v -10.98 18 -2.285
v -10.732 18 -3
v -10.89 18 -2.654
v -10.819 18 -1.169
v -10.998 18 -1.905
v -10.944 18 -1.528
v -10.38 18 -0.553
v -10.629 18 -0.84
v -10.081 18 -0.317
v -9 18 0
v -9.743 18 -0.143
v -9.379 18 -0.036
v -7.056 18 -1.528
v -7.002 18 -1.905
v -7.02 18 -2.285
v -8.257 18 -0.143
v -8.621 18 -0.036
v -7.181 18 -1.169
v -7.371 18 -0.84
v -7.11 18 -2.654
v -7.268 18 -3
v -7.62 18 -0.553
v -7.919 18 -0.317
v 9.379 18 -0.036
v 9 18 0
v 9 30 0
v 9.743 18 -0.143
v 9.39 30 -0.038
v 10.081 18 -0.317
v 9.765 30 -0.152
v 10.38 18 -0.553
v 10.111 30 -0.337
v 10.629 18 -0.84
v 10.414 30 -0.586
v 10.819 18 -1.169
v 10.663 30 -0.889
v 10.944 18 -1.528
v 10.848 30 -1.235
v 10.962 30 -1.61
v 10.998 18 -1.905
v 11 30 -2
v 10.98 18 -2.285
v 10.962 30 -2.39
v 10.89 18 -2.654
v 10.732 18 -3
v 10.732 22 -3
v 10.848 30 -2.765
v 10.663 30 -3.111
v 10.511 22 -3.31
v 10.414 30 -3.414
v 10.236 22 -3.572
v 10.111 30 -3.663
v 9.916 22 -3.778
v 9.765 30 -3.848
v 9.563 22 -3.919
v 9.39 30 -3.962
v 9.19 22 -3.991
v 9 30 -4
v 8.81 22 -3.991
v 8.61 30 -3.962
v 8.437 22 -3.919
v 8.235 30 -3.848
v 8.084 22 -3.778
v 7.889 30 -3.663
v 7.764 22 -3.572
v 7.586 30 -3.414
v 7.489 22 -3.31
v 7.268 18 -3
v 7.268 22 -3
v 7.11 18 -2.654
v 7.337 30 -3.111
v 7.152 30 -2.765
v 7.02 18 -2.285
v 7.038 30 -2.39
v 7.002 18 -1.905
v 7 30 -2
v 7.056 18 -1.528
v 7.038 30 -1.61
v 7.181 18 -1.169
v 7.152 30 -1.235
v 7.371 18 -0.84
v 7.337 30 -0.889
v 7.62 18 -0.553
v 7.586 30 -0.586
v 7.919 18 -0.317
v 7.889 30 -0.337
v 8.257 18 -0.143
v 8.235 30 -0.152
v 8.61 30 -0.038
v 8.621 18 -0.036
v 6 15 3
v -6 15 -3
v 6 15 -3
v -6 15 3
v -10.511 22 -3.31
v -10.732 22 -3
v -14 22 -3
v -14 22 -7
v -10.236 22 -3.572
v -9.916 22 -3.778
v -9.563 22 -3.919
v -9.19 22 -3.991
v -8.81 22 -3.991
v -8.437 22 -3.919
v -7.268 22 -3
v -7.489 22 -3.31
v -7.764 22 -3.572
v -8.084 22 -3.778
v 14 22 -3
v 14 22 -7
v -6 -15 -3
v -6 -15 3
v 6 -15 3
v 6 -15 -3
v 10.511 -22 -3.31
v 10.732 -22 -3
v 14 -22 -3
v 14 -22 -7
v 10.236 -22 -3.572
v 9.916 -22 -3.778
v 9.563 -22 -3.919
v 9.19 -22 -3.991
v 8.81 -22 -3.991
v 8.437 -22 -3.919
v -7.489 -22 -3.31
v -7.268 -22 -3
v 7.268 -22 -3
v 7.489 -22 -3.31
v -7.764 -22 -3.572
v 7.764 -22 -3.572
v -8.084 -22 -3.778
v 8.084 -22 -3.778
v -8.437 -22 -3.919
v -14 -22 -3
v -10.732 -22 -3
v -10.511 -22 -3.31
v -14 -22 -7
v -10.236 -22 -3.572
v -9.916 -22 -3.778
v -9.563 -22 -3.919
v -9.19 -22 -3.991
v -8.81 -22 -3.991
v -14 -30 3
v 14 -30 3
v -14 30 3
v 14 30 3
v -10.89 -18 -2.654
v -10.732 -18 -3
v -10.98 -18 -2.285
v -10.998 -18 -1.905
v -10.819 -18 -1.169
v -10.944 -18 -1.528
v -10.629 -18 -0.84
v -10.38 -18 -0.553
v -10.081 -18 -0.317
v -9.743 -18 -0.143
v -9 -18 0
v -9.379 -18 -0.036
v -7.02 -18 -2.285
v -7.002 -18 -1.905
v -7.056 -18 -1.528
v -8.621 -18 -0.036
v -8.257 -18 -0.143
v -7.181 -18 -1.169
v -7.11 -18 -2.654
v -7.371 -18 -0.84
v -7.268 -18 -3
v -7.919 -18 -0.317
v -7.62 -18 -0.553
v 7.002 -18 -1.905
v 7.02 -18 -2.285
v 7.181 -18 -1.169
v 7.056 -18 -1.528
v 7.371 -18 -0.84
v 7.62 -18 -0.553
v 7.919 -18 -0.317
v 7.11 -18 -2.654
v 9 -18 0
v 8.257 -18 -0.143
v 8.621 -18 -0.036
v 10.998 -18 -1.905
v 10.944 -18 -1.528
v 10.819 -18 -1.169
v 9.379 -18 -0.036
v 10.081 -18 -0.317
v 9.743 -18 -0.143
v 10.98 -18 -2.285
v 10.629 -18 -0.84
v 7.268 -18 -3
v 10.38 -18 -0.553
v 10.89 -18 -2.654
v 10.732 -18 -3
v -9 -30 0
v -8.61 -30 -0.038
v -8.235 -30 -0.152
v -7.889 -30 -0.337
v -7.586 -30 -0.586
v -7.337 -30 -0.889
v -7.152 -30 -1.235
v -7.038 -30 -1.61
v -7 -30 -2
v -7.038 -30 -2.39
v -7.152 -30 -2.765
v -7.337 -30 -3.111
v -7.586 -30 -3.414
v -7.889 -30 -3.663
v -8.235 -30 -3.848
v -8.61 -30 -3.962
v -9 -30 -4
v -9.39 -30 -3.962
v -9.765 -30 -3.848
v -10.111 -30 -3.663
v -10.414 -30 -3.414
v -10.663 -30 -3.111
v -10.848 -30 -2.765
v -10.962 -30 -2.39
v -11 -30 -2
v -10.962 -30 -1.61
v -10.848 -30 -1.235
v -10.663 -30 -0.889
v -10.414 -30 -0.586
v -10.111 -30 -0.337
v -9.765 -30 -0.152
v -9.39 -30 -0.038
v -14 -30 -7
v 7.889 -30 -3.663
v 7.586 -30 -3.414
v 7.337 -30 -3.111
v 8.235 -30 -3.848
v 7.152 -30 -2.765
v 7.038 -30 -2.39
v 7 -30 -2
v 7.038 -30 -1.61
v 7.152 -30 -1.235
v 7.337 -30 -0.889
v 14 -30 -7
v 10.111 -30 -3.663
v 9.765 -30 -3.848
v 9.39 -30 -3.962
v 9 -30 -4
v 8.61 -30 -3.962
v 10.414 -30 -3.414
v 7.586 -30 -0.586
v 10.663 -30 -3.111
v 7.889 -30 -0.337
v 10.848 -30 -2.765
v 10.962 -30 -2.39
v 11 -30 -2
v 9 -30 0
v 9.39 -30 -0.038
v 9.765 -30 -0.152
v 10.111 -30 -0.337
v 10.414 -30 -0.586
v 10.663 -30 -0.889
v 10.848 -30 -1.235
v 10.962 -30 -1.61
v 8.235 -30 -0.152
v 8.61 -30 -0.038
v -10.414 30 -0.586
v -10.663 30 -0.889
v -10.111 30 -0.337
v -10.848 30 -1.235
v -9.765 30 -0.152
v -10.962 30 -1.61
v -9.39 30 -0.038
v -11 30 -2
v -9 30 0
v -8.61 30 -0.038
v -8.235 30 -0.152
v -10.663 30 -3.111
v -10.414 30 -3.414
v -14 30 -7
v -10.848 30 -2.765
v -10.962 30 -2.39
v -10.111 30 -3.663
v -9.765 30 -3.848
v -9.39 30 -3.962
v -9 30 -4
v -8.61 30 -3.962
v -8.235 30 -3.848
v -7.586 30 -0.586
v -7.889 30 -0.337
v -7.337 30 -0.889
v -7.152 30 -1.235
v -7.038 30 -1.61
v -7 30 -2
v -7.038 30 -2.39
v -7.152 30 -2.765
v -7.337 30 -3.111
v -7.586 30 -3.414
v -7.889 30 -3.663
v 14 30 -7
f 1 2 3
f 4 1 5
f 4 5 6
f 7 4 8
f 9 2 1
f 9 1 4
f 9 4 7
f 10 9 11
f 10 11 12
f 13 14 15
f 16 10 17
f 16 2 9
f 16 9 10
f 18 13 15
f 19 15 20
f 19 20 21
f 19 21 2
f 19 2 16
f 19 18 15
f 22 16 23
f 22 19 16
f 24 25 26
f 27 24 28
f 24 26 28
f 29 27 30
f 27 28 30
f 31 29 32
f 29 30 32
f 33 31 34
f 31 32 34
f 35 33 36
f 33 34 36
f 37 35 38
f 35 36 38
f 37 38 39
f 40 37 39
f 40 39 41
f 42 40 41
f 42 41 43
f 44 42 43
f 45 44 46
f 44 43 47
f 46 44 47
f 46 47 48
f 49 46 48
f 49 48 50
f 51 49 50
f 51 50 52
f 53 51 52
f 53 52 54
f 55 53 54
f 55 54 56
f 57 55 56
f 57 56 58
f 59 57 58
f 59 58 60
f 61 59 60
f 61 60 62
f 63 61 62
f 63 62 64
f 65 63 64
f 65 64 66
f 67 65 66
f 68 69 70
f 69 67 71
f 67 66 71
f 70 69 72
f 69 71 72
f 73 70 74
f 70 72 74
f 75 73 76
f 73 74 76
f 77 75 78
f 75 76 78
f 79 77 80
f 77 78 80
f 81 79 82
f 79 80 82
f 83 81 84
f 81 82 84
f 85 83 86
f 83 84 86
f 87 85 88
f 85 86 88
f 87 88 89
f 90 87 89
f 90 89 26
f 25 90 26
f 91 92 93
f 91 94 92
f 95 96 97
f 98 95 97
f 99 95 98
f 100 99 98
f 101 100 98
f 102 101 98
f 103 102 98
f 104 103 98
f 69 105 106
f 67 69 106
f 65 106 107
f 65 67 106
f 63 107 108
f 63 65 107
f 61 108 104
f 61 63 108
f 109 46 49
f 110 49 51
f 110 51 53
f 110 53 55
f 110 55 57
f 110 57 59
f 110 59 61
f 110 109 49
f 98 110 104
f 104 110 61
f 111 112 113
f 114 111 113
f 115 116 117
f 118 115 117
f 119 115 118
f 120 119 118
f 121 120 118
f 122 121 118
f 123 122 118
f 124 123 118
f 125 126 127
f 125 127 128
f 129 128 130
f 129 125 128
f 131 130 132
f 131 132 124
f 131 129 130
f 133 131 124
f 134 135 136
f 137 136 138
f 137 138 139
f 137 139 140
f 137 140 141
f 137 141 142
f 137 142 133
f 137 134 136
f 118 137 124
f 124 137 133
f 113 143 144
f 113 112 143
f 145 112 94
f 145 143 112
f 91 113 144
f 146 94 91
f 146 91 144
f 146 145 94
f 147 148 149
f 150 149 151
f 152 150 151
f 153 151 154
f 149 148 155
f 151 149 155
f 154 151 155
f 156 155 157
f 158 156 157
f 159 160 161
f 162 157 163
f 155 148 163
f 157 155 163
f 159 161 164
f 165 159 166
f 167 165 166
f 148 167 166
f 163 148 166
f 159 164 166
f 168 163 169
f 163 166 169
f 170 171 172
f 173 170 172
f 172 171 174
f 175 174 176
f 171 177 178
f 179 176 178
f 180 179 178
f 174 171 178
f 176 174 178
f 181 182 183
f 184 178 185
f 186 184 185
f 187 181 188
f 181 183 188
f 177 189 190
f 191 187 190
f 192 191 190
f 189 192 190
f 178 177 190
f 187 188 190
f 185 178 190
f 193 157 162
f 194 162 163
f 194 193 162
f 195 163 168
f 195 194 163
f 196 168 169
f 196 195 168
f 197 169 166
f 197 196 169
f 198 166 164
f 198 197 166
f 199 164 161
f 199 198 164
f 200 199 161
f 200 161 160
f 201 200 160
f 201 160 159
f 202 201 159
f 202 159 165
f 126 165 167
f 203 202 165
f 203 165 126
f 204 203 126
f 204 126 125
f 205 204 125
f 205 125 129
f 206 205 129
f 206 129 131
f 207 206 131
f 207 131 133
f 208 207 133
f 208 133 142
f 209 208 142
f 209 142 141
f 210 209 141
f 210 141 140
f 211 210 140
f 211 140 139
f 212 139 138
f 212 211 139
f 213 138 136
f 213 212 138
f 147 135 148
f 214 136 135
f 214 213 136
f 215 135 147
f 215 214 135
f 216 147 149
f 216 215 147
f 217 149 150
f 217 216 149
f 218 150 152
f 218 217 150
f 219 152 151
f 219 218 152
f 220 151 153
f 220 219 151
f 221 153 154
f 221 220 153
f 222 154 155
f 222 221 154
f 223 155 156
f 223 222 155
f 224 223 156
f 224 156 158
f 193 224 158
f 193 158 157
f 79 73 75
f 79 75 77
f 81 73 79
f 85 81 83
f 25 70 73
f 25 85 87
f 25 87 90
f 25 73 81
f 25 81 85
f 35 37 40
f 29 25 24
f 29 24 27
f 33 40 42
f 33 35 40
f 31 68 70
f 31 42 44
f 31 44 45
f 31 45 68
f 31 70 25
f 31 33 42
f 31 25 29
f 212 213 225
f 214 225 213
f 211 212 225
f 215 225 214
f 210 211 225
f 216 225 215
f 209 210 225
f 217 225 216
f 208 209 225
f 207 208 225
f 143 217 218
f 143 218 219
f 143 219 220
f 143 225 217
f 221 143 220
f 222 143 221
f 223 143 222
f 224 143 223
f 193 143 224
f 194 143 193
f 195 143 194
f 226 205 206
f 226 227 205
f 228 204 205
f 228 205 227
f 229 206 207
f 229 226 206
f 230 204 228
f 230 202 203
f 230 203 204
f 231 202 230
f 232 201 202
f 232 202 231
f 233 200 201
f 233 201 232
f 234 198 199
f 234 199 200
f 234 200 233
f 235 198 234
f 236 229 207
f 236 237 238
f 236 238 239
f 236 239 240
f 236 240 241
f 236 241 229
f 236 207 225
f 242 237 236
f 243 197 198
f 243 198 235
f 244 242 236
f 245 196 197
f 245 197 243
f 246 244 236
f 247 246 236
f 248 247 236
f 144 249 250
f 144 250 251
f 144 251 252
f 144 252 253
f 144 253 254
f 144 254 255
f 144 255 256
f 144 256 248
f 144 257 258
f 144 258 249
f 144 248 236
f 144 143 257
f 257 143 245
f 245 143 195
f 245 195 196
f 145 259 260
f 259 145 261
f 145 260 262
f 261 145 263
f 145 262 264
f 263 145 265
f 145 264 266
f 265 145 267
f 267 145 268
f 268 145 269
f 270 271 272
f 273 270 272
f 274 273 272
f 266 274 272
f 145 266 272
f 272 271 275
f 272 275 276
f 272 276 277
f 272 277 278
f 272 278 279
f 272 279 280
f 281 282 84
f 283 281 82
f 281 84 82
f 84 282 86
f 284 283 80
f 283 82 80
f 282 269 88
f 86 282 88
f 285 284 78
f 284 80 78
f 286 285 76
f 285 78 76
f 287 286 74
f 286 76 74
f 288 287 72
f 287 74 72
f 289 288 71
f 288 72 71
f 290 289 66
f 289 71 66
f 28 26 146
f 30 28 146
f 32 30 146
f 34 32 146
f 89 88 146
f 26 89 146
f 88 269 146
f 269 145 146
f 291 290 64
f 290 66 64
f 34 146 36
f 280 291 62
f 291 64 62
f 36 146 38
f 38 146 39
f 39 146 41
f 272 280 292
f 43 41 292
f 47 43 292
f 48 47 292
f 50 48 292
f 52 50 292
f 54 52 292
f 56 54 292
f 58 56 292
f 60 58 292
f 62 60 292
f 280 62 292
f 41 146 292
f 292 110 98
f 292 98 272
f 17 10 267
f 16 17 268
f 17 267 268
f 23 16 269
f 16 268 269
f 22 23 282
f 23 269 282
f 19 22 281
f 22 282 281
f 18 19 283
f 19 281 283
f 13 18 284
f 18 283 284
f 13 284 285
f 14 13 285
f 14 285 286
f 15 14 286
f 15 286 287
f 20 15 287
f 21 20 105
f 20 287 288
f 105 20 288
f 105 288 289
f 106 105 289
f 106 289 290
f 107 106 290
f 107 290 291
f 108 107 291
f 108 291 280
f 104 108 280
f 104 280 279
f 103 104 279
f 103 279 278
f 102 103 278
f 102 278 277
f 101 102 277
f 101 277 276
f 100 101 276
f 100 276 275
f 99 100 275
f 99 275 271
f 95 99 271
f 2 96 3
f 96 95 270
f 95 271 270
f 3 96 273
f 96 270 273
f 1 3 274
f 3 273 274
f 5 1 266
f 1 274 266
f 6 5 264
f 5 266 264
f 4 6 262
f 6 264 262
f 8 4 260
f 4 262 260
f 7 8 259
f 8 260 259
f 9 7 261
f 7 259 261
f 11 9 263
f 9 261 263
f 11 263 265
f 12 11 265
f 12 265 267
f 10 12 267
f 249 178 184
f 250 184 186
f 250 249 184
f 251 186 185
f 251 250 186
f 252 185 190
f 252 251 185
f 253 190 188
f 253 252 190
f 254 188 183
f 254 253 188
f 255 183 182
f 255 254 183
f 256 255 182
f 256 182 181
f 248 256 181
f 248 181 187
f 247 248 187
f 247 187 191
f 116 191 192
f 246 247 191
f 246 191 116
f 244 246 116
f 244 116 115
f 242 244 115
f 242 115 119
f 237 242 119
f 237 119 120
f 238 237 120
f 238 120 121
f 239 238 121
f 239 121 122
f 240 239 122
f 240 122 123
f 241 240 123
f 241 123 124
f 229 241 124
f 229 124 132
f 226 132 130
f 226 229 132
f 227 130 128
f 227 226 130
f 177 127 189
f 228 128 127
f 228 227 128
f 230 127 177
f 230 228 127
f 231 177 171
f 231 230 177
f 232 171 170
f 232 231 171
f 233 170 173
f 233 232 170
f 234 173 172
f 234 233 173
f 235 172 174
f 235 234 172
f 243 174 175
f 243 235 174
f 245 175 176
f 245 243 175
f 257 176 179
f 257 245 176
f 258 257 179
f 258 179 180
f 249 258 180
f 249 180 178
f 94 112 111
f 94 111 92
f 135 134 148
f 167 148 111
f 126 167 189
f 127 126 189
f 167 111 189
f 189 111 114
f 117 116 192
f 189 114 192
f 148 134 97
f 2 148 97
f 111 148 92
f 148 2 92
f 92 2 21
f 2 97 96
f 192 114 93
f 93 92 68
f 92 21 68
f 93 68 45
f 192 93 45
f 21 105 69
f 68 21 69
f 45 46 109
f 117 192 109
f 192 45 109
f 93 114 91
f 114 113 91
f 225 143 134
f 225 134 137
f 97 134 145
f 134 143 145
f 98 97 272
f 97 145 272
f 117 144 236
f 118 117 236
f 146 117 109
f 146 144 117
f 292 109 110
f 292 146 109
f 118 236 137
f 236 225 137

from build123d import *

# Parameters (mm, degrees)
SKETCH_1_W          = 28
SKETCH_1_H          = 60
SKETCH_1_W_2        = 12
SKETCH_1_H_2        = 30
EXTRUDE_1_DEPTH     = 3
SKETCH_3_W          = 4
SKETCH_3_H          = 8
EXTRUDE_2_DEPTH     = 14
SKETCH_2_R          = 2
CUT_EXTRUDE_1_DEPTH = 12


with BuildPart() as part:
    # 草图1 → 凸台-拉伸1 (new, symmetric)
    with BuildSketch(Plane.XY):
        Rectangle(SKETCH_1_W, SKETCH_1_H)
        Rectangle(SKETCH_1_W_2, SKETCH_1_H_2, mode=Mode.SUBTRACT)
    extrude(amount=EXTRUDE_1_DEPTH, both=True)

    # 草图3 → 凸台-拉伸2 (add, symmetric)
    with BuildSketch(Plane(origin=(0, 0, 0), x_dir=(0, 0, -1), z_dir=(1, 0, 0))):
        with Locations((5, -26)):
            Rectangle(SKETCH_3_W, SKETCH_3_H)
        with Locations((5, 26)):
            Rectangle(SKETCH_3_W, SKETCH_3_H)
    extrude(amount=EXTRUDE_2_DEPTH, both=True)

    # 草图2 → 切除-拉伸1 (cut)
    with BuildSketch(Plane(origin=(0, 30, 0), x_dir=(1, 0, 0), z_dir=(0, 1, 0))):
        with Locations(Location((-9, 2, 0), (0, 0, 270))):
            Circle(SKETCH_2_R)
        with Locations(Location((9, 2, 0), (0, 0, 270))):
            Circle(SKETCH_2_R)
    cut_extrude_1 = extrude(amount=-CUT_EXTRUDE_1_DEPTH, mode=Mode.SUBTRACT)

    # 镜向1: 切除-拉伸1 across plane
    add(cut_extrude_1.mirror(Plane.ZX), mode=Mode.SUBTRACT)


solid = part.part
